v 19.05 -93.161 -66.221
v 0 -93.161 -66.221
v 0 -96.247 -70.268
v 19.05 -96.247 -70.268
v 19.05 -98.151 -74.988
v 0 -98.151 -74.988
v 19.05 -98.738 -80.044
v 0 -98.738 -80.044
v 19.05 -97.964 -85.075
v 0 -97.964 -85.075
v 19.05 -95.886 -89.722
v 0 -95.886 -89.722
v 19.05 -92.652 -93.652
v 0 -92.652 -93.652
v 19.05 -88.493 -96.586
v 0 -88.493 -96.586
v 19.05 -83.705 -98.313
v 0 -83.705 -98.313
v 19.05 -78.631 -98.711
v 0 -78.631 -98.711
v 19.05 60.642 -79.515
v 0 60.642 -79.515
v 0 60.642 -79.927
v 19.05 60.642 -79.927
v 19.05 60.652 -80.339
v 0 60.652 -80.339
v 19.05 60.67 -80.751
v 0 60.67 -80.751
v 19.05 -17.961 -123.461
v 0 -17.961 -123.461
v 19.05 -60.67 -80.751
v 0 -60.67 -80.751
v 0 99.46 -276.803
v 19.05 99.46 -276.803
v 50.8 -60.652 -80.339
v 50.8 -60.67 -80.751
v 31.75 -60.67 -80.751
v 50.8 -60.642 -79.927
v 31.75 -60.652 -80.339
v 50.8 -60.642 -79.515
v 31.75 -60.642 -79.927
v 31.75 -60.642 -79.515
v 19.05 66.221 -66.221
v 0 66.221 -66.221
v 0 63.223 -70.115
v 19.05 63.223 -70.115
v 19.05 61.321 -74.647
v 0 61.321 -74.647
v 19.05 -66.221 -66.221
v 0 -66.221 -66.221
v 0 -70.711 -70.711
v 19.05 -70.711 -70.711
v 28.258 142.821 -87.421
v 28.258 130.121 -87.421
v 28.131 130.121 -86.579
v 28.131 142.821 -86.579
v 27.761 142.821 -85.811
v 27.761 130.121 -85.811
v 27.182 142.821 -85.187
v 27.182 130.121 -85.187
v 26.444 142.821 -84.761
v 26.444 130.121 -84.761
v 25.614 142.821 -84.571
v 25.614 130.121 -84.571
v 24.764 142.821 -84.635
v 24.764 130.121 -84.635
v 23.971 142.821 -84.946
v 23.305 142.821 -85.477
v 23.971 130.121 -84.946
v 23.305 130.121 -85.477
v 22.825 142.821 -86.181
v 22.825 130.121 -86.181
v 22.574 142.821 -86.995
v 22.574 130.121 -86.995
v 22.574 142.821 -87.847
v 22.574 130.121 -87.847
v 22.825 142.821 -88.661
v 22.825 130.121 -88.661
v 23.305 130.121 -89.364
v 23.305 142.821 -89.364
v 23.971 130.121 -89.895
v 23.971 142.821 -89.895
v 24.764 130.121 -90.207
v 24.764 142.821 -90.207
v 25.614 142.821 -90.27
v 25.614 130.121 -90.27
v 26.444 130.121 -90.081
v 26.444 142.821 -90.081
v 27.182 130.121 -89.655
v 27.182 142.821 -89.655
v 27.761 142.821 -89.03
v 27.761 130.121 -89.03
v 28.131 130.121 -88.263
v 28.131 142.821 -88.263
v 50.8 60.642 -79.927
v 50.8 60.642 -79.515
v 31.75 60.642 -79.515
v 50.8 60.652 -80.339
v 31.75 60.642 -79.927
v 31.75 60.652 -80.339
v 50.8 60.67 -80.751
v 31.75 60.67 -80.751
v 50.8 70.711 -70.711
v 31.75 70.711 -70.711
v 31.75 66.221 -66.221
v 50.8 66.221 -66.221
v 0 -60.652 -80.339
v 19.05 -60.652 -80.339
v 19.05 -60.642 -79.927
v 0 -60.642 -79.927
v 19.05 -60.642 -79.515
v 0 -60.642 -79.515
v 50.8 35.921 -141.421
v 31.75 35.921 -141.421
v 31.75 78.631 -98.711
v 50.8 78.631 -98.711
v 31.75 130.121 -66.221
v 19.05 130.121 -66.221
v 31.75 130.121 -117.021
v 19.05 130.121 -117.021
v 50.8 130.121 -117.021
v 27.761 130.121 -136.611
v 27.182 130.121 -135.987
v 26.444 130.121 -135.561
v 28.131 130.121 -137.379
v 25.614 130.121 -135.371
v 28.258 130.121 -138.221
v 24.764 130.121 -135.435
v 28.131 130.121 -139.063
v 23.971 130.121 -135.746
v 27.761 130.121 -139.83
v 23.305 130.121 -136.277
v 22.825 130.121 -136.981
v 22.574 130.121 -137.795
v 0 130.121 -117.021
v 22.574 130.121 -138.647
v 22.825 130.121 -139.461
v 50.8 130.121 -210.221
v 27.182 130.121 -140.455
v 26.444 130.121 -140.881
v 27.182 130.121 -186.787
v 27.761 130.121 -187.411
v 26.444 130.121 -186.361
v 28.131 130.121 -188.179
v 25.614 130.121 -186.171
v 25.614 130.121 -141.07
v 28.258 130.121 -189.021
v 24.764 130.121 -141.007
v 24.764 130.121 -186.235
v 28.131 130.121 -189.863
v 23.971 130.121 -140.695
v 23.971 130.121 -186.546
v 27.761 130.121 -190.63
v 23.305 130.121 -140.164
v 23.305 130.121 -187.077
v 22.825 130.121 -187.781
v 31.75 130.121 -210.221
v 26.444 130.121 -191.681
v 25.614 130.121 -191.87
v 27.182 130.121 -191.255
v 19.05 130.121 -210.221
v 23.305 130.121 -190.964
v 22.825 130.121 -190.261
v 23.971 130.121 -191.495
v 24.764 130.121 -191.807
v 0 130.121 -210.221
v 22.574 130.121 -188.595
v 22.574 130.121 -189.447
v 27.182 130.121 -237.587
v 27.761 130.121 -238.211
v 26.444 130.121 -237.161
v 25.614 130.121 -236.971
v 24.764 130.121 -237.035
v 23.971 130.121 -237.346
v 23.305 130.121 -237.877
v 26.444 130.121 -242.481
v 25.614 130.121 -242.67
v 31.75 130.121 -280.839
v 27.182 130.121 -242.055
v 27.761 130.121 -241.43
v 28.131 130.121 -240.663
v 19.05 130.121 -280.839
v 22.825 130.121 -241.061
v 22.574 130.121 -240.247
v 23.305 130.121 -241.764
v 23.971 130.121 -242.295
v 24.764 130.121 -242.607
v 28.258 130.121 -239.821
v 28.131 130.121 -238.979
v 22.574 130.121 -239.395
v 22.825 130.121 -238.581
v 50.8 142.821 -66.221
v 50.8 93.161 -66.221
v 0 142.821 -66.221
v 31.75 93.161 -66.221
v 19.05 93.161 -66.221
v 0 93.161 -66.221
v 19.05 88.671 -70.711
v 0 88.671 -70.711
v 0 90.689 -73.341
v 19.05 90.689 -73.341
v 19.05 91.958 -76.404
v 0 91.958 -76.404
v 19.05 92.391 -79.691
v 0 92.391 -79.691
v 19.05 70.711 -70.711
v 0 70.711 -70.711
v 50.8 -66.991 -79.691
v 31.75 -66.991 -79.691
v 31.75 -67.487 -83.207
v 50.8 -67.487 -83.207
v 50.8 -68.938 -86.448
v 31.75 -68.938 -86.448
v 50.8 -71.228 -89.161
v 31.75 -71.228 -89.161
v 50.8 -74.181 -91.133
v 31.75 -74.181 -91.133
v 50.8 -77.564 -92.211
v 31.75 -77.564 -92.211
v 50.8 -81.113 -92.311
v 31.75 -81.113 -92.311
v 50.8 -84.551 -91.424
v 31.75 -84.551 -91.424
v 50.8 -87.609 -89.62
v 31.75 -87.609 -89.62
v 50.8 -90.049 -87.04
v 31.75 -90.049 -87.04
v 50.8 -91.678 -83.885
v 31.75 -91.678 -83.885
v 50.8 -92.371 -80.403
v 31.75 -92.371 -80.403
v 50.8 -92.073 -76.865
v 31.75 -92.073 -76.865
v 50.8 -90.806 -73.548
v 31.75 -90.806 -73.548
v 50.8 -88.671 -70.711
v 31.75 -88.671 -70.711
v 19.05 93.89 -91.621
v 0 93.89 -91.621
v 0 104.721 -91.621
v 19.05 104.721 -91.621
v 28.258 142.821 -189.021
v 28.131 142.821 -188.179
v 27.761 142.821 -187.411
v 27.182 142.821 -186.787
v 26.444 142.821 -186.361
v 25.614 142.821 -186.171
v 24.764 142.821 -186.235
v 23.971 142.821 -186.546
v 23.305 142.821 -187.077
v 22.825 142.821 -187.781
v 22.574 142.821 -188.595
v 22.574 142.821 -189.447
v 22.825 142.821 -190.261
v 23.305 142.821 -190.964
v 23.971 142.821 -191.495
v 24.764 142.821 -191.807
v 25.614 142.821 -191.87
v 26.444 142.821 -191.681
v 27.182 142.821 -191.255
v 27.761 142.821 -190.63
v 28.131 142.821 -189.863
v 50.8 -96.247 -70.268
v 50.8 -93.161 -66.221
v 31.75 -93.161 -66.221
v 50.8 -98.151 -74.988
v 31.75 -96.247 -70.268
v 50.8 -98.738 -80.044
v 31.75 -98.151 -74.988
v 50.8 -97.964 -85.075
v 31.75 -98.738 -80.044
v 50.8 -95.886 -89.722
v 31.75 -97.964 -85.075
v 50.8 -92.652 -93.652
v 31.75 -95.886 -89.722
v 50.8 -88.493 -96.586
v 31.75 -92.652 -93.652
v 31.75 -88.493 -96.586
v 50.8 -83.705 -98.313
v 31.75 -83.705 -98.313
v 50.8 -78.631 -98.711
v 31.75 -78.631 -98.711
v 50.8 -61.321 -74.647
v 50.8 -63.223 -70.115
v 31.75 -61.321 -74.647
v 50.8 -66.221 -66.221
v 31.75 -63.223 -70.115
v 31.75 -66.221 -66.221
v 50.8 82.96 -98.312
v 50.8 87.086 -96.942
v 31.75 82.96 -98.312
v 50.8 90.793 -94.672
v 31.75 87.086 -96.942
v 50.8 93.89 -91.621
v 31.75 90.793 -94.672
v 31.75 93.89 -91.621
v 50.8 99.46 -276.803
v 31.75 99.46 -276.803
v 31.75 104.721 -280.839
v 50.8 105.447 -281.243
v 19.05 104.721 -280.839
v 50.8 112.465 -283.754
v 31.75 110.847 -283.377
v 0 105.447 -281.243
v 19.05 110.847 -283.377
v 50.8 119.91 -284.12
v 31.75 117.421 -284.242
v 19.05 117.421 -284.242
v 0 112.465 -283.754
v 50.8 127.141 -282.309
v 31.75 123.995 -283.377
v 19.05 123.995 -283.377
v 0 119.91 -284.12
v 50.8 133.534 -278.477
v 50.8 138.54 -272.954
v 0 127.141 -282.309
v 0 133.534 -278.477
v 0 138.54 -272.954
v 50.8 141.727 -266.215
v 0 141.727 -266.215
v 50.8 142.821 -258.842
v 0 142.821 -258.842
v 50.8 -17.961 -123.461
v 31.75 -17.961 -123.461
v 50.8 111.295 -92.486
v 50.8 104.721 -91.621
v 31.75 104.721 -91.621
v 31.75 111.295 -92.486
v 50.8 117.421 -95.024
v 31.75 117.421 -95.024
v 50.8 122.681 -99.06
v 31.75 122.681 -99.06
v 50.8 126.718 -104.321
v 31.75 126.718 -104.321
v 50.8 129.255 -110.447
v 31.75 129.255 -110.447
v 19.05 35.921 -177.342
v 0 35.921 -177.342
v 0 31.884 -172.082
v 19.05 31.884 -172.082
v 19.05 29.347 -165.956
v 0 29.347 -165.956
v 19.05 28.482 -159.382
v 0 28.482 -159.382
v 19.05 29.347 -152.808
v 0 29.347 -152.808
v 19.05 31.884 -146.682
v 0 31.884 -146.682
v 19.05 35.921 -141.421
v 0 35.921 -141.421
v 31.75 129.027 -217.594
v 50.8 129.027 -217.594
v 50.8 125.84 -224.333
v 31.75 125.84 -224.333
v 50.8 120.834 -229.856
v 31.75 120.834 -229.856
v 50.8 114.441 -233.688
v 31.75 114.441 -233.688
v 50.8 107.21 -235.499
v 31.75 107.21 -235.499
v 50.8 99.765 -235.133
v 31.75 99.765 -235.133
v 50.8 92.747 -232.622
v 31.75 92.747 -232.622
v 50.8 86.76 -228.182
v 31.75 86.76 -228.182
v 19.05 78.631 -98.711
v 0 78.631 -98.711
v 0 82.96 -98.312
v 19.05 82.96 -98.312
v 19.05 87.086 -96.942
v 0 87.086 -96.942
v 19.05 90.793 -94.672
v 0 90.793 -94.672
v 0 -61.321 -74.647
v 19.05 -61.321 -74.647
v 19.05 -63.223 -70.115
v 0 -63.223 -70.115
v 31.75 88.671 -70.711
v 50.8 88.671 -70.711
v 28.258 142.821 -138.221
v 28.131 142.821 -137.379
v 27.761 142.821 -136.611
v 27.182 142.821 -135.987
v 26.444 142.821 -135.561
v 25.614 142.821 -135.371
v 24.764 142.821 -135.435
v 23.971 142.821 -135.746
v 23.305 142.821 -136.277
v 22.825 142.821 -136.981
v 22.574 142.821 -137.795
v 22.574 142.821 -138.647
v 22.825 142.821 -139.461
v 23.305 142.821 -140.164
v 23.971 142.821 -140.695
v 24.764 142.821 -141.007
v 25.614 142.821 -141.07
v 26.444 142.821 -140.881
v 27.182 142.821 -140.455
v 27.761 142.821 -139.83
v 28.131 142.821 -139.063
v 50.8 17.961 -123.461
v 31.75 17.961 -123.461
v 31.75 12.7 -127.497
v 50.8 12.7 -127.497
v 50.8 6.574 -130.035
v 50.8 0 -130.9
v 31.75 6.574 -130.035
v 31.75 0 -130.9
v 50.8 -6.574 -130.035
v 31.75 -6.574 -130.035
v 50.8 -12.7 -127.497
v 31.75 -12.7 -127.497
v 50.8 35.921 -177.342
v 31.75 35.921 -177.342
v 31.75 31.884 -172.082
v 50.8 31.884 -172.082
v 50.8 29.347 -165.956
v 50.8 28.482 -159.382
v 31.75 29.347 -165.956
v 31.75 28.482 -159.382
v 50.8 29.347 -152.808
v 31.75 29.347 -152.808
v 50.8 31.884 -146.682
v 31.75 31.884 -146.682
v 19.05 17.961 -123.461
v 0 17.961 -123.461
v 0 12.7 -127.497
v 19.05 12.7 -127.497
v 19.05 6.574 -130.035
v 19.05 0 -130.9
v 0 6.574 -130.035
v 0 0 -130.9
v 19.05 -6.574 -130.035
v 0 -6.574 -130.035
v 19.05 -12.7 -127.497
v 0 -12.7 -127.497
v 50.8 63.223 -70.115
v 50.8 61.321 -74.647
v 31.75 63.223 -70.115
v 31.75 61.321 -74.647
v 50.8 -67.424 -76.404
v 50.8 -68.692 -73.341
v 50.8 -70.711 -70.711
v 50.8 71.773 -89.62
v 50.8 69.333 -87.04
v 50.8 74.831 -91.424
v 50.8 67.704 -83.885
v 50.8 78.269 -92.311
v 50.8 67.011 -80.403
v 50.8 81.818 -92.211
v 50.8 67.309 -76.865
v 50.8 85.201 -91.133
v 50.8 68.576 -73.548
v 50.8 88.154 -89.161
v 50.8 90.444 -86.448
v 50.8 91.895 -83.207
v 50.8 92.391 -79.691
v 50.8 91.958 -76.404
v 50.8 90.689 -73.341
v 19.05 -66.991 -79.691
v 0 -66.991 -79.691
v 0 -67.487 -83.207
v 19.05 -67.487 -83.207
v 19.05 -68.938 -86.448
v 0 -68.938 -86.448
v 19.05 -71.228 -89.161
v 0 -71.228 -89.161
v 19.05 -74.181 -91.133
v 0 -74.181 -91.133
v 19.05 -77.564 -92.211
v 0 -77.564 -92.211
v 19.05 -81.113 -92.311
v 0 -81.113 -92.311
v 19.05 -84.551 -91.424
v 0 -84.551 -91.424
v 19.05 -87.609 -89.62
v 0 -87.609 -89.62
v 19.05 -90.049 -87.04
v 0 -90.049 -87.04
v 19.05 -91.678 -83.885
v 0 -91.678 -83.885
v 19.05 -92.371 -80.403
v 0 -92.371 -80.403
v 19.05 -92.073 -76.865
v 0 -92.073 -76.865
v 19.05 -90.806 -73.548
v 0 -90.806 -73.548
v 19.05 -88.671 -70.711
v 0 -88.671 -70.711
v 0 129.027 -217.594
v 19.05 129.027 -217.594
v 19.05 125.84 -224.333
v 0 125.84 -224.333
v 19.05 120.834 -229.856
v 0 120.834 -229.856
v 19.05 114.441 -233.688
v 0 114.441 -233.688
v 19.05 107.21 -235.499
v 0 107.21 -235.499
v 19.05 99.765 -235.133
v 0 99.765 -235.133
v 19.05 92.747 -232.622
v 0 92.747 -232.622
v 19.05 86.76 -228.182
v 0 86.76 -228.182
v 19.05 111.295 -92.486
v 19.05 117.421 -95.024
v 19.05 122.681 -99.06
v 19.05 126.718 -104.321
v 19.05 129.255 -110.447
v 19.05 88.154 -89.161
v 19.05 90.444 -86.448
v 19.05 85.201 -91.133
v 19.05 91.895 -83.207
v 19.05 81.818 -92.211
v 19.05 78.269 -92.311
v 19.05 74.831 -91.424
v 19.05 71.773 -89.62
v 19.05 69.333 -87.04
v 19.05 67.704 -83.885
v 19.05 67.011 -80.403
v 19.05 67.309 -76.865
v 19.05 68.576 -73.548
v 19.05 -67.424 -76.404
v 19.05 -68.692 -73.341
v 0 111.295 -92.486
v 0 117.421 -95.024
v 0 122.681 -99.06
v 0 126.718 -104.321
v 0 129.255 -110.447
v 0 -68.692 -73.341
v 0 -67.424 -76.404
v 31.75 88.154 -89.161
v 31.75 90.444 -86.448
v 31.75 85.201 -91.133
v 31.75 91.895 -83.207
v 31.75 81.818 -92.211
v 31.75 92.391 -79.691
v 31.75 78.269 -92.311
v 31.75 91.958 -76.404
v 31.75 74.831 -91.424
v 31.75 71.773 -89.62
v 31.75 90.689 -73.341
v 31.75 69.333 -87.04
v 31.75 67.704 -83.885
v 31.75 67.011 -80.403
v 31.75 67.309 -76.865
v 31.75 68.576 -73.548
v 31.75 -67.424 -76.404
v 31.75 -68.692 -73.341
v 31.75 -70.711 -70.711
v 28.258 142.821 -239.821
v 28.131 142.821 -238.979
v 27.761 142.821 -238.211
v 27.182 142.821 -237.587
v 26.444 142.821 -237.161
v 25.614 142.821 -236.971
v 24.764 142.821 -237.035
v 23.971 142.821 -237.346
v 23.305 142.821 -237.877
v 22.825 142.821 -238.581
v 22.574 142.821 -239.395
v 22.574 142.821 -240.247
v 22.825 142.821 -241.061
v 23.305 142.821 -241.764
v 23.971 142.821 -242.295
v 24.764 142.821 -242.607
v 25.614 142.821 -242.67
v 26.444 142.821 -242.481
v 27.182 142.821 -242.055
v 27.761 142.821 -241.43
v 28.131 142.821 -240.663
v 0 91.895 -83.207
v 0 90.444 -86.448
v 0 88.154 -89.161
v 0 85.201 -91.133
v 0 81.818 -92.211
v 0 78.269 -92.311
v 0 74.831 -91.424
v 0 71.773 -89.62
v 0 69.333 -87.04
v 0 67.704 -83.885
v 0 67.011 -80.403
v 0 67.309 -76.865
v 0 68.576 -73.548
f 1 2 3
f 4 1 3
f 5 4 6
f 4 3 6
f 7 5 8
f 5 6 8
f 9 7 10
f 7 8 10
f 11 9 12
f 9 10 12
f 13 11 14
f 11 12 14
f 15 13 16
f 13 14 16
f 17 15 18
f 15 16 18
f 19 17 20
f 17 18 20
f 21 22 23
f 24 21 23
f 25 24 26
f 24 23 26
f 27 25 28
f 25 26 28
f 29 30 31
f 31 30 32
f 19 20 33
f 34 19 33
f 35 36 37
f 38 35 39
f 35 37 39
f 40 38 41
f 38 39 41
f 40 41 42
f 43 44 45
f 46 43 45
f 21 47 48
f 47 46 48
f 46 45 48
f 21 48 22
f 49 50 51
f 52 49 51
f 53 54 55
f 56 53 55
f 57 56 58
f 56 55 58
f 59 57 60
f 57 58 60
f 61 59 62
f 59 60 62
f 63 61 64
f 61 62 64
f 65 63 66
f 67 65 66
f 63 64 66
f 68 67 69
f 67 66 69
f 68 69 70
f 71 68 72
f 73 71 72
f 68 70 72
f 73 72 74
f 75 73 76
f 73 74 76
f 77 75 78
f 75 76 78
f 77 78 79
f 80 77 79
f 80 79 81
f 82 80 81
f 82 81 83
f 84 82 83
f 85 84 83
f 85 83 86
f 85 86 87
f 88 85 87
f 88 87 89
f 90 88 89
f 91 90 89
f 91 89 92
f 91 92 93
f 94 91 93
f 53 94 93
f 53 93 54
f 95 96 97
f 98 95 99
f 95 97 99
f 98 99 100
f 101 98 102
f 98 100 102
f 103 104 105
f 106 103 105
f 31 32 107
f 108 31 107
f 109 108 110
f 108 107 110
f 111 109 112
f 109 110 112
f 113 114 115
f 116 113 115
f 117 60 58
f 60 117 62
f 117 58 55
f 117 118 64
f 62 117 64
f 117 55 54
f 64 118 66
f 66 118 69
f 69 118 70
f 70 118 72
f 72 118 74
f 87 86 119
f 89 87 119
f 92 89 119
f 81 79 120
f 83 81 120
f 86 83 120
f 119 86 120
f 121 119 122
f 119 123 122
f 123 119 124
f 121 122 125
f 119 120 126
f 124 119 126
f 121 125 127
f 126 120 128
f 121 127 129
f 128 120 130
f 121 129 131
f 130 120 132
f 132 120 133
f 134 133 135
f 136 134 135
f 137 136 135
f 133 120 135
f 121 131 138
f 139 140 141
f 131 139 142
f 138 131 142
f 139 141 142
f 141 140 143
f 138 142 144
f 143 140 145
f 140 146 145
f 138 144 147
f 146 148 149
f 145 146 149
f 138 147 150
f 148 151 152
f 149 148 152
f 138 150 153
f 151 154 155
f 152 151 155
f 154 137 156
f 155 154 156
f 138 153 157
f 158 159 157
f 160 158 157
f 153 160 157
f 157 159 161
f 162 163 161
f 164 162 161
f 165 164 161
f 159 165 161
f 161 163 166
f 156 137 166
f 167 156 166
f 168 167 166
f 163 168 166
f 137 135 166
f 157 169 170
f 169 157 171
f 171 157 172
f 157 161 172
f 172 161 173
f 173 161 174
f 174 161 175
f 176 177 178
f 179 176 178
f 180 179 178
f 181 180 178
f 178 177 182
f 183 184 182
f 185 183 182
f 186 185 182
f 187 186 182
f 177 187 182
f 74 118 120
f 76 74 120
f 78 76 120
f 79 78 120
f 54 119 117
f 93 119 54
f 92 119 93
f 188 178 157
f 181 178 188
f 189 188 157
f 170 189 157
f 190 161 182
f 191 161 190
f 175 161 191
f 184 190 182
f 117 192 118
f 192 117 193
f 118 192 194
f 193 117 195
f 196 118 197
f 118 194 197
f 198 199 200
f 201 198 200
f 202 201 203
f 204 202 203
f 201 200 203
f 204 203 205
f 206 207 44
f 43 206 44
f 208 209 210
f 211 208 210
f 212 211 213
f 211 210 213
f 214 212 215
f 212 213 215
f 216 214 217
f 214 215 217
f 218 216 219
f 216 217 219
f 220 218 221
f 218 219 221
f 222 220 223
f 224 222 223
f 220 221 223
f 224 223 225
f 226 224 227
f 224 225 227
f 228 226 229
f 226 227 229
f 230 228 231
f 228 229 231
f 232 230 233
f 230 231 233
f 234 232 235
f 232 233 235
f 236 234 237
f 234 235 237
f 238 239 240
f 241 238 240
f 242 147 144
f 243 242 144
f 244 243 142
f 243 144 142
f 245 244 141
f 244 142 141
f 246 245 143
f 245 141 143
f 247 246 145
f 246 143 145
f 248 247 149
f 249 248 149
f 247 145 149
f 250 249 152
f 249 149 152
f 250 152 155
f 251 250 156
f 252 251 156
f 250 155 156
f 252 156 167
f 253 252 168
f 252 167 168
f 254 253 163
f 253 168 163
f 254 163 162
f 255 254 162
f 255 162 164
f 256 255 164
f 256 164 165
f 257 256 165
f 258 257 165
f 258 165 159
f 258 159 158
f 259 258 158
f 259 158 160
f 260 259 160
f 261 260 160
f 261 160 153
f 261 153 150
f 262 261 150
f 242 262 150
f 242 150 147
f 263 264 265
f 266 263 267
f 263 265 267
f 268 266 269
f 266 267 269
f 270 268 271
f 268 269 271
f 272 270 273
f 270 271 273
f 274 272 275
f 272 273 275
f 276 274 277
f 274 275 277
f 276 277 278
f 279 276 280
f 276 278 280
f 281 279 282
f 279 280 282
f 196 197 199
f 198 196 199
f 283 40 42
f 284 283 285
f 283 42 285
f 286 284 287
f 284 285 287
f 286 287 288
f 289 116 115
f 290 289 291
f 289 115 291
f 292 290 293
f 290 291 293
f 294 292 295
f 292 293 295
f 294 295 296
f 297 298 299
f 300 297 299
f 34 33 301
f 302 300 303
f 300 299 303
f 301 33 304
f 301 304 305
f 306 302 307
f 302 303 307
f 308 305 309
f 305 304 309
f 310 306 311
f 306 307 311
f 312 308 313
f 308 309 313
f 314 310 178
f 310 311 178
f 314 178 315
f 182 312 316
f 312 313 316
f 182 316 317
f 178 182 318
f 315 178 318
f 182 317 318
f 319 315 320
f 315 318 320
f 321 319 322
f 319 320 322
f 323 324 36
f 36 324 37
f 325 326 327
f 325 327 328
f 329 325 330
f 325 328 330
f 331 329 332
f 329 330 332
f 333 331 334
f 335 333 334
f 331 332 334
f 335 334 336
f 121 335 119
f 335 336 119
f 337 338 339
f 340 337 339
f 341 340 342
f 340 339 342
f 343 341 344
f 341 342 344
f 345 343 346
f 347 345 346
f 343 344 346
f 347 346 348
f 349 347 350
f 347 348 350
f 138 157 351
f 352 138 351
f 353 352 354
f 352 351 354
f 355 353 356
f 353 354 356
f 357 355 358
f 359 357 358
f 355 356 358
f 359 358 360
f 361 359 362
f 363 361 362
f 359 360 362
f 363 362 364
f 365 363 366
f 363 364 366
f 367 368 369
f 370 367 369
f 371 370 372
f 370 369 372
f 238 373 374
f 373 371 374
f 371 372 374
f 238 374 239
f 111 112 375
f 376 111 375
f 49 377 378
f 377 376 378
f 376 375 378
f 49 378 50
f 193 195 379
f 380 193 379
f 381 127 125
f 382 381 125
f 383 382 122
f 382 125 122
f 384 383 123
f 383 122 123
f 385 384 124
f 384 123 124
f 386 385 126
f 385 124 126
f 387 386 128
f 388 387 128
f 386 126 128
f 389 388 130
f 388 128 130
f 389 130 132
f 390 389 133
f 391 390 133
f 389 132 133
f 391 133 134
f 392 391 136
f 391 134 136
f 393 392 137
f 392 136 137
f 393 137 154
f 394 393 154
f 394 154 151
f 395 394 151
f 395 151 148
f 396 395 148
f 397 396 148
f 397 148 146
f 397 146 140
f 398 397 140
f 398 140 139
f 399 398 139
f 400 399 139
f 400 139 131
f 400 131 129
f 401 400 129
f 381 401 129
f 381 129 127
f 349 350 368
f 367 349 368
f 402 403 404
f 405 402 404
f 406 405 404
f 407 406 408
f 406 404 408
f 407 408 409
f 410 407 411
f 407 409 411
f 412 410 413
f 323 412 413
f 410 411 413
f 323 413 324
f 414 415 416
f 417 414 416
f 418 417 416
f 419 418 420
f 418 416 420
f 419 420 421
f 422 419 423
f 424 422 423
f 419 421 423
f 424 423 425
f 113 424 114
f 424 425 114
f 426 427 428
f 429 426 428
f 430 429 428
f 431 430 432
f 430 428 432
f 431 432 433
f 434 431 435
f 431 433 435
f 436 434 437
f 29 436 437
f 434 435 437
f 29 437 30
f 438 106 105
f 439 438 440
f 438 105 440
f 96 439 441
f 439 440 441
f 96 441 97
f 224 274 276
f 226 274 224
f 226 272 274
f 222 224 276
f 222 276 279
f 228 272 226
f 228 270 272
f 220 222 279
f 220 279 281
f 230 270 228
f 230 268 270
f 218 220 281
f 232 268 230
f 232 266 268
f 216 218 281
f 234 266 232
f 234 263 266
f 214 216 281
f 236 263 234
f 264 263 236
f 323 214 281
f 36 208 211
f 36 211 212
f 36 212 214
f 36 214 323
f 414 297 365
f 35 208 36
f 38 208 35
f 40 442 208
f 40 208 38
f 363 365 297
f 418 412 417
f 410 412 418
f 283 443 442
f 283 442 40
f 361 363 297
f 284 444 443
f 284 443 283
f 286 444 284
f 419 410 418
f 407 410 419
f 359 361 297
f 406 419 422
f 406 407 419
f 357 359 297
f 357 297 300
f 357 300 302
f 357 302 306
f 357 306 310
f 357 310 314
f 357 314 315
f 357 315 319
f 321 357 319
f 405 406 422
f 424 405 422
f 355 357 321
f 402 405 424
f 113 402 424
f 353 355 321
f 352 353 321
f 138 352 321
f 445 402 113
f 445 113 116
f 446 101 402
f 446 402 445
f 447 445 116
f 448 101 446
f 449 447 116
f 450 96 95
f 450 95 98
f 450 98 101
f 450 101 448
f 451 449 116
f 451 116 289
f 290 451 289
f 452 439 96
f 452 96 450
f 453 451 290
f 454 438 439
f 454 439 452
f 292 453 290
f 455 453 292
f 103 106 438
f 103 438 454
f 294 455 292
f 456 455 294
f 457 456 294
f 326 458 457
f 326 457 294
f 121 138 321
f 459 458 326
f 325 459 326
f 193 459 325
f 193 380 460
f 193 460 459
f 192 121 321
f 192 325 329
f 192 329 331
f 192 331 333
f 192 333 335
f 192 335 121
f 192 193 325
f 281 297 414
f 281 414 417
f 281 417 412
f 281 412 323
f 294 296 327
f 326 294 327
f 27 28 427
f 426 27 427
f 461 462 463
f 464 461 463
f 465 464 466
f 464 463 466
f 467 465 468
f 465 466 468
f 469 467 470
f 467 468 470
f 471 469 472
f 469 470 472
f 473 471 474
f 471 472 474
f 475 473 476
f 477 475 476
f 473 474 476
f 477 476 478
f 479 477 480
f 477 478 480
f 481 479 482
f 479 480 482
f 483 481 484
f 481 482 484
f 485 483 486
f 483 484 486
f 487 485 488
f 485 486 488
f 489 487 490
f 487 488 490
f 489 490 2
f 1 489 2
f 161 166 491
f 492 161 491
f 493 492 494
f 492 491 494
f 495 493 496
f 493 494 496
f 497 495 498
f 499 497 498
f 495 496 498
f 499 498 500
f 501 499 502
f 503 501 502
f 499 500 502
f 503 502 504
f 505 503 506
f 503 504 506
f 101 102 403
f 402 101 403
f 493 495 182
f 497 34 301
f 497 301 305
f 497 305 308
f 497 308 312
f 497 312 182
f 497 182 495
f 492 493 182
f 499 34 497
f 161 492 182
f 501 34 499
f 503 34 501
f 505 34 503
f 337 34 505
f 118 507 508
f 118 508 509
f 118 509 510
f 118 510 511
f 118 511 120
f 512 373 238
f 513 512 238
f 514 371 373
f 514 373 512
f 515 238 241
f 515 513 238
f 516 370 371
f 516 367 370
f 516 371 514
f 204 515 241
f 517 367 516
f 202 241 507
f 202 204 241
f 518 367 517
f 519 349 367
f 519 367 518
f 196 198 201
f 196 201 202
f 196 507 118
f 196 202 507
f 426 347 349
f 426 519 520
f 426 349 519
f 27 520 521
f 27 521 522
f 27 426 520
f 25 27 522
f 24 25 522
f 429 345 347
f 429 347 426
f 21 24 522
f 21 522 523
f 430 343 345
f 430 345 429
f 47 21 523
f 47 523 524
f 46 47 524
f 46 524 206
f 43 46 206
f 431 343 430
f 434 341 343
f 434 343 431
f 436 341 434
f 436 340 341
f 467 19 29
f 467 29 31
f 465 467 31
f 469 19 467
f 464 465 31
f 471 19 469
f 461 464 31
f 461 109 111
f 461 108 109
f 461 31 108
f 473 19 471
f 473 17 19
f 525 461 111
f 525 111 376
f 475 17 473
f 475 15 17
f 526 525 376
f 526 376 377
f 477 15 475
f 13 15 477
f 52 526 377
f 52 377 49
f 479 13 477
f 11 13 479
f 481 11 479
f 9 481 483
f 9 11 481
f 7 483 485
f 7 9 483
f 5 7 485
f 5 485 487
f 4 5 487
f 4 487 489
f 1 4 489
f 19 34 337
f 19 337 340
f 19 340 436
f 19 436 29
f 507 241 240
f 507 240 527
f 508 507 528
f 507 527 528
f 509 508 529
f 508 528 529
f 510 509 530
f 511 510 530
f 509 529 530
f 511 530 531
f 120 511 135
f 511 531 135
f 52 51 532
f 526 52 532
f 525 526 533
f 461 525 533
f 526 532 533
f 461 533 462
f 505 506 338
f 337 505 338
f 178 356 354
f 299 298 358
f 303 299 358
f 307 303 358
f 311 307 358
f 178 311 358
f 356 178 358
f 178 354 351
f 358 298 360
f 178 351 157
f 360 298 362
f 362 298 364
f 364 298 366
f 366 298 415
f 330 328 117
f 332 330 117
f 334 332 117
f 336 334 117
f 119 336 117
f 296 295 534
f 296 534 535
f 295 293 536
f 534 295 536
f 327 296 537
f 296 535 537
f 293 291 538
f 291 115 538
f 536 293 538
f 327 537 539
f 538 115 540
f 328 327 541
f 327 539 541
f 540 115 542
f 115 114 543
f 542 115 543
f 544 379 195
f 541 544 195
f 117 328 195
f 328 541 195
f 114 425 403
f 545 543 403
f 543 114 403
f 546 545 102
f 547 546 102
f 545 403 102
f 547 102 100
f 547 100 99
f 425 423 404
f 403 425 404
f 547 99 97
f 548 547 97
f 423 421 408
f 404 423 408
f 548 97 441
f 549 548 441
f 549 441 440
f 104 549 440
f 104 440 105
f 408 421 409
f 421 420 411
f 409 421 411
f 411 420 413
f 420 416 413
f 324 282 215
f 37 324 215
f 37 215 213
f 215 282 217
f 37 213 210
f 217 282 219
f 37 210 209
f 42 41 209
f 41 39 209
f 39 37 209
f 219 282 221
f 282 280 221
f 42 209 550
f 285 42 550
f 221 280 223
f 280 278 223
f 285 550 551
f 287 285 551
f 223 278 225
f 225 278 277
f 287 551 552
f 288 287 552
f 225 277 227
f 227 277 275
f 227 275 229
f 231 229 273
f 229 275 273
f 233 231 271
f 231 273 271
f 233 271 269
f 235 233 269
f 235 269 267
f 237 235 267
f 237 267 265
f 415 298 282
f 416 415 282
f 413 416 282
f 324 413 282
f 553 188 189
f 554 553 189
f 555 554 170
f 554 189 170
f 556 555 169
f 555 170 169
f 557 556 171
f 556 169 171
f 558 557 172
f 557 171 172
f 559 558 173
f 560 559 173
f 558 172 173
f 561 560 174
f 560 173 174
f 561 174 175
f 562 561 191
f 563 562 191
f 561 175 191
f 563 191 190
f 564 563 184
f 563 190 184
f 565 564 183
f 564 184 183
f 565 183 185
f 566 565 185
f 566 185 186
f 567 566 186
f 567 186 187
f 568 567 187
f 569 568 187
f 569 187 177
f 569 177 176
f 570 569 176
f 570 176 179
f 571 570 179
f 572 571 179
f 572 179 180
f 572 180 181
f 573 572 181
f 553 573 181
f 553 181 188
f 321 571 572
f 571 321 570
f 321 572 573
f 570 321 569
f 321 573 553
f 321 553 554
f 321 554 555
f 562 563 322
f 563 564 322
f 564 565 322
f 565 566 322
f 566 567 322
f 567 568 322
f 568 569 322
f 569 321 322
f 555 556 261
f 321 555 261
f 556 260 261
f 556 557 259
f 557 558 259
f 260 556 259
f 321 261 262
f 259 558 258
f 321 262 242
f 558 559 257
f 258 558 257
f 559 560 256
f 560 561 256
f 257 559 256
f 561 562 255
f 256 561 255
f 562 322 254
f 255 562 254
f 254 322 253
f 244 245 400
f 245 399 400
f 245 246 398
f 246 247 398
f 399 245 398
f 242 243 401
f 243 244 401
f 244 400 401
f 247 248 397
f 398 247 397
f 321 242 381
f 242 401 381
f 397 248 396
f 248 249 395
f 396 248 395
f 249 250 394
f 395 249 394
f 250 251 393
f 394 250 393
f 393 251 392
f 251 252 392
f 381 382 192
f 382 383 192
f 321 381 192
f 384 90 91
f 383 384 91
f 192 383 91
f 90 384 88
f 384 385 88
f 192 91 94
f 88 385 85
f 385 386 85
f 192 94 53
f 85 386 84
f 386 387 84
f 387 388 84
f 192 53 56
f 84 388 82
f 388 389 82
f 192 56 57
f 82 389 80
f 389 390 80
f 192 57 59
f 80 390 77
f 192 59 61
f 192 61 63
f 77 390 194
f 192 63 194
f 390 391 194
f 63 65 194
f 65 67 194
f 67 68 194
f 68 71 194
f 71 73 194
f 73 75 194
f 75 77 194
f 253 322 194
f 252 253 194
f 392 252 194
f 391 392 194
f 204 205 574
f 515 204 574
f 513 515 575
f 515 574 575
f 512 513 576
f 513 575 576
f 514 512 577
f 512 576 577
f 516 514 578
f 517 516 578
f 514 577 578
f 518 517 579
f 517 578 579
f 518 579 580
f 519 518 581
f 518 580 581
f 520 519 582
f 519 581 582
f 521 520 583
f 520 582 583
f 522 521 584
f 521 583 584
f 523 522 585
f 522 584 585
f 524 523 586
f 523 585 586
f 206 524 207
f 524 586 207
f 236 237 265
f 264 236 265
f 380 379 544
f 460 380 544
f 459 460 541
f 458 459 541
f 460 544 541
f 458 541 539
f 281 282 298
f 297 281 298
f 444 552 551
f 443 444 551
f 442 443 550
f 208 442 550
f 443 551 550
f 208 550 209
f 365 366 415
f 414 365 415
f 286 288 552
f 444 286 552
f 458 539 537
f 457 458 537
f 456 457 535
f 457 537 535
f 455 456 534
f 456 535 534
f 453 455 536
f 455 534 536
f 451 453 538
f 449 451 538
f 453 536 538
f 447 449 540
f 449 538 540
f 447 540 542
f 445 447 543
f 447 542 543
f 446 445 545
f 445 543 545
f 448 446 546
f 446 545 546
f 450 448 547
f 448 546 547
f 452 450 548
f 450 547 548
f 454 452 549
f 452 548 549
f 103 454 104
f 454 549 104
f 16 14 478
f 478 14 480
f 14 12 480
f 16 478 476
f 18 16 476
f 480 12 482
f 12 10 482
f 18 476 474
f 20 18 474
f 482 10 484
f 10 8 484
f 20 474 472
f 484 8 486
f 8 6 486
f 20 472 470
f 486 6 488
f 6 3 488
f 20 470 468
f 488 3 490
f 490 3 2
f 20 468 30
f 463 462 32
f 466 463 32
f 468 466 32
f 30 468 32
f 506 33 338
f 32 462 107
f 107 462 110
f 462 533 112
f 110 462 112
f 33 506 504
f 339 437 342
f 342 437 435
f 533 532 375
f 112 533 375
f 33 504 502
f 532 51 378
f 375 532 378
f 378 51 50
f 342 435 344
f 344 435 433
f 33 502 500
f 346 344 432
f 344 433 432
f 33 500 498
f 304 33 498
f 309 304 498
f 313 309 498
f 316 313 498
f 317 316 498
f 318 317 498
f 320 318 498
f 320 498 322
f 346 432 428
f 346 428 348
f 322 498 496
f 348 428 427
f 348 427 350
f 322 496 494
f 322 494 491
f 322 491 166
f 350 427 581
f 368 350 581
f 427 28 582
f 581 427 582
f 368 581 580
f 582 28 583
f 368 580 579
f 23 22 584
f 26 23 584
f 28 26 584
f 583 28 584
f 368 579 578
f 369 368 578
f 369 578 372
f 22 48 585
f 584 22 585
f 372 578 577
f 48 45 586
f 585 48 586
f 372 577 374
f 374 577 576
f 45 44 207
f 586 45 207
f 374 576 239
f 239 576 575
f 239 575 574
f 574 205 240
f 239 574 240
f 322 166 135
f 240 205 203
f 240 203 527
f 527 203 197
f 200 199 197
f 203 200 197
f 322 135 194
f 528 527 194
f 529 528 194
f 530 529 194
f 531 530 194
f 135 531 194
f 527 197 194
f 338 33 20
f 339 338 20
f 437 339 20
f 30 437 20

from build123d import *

# Parameters (mm, degrees)
F1_DEPTH = 50.8
F3_W     = 12.7
F3_H     = 218.0215369846
F4_DEPTH = 254
F5_R     = 2.8575
F6_DEPTH = 12.701


with BuildPart() as f1:
    # F0 (on Right) → F1 (new body)
    with BuildSketch(Plane.YZ):
        with BuildLine():
            ThreePointArc((92.3909342397, -79.6909342397), (74.8308546487, -91.4242043026), (70.7106781187, -70.7106781187))
            ThreePointArc((70.7106781187, -70.7106781187), (65.8235712608, -75.2811893269), (60.6417499855, -79.5146411593))
            ThreePointArc((60.6417499855, -79.5146411593), (60.6460643138, -80.133008335), (60.6704465476, -80.7509096897))
            Line((60.6704465476, -80.7509096897), (17.9605122421, -123.4608439952))
            ThreePointArc((17.9605122421, -123.4608439952), (0, -130.900331753), (-17.9605122421, -123.4608439952))
            Line((-17.9605122421, -123.4608439952), (-60.6704465476, -80.7509096897))
            ThreePointArc((-60.6704465476, -80.7509096897), (-60.6460643138, -80.133008335), (-60.6417499855, -79.5146411593))
            ThreePointArc((-60.6417499855, -79.5146411593), (-65.8235712608, -75.2811893269), (-70.7106781187, -70.7106781187))
            ThreePointArc((-70.7106781187, -70.7106781187), (-67.9576641768, -74.8308546487), (-66.9909342397, -79.6909342397))
            ThreePointArc((-66.9909342397, -79.6909342397), (-84.5510138308, -91.4242043026), (-88.6711903608, -70.7106781187))
            Line((-88.6711903608, -70.7106781187), (-93.1613184213, -66.2205500581))
            ThreePointArc((-93.1613184213, -66.2205500581), (-97.0811254405, -87.4680641731), (-78.6309587898, -98.7114219318))
            Line((-78.6309587898, -98.7114219318), (99.4602185633, -276.8025992848))
            ThreePointArc((99.4602185633, -276.8025992848), (127.1408899875, -282.3086271685), (142.8207308054, -258.8420870427))
            Line((142.8207308054, -258.8420870427), (142.8207308054, -66.2205500581))
            Line((142.8207308054, -66.2205500581), (130.1207308054, -66.2205500581))
            Line((130.1207308054, -66.2205500581), (93.1613184213, -66.2205500581))
            Line((93.1613184213, -66.2205500581), (88.6711903608, -70.7106781187))
            ThreePointArc((88.6711903608, -70.7106781187), (91.4242043026, -74.8308546487), (92.3909342397, -79.6909342397))
        make_face()
        with BuildLine():
            ThreePointArc((78.6309587898, -98.7114219318), (87.0857697361, -96.9419835869), (93.8899658968, -91.6205500581))
            Line((93.8899658968, -91.6205500581), (104.7207308054, -91.6205500581))
            ThreePointArc((104.7207308054, -91.6205500581), (122.6812430475, -99.060037816), (130.1207308054, -117.0205500581))
            Line((130.1207308054, -117.0205500581), (130.1207308054, -210.2210625584))
            ThreePointArc((130.1207308054, -210.2210625584), (114.4408899875, -233.6876026842), (86.7602185633, -228.1815748006))
            Line((86.7602185633, -228.1815748006), (35.9210244843, -177.3423807216))
            ThreePointArc((35.9210244843, -177.3423807216), (28.4815367264, -159.3818684794), (35.9210244843, -141.4213562373))
            Line((35.9210244843, -141.4213562373), (78.6309587898, -98.7114219318))
        make_face(mode=Mode.SUBTRACT)
        with BuildLine():
            ThreePointArc((60.6417499855, -79.5146411593), (65.8235712608, -75.2811893269), (70.7106781187, -70.7106781187))
            Line((70.7106781187, -70.7106781187), (66.2205500581, -66.2205500581))
            ThreePointArc((66.2205500581, -66.2205500581), (62.1249501408, -72.3194552405), (60.6417499855, -79.5146411593))
        make_face()
        with BuildLine():
            Line((-66.2205500581, -66.2205500581), (-70.7106781187, -70.7106781187))
            ThreePointArc((-70.7106781187, -70.7106781187), (-65.8235712608, -75.2811893269), (-60.6417499855, -79.5146411593))
            ThreePointArc((-60.6417499855, -79.5146411593), (-62.1249501408, -72.3194552405), (-66.2205500581, -66.2205500581))
        make_face()
    extrude(amount=F1_DEPTH)

    # F3 (on offset) → F4 (cut, through all)
    with BuildSketch(Plane.XZ.offset(123.8792691946)):
        with Locations((25.4, -175.2313185504)):
            Rectangle(F3_W, F3_H)
    extrude(amount=-F4_DEPTH, mode=Mode.SUBTRACT)

    # F5 (on face) → F6 (cut, through all)
    with BuildSketch(Plane.XZ.offset(-130.1207308054)):
        with Locations((25.4, -138.2208063083)):
            Circle(F5_R)
        with Locations((25.4, -87.4208063083)):
            Circle(F5_R)
        with Locations((25.4, -239.8208063083)):
            Circle(F5_R)
        with Locations((25.4, -189.0208063083)):
            Circle(F5_R)
    extrude(amount=-F6_DEPTH, mode=Mode.SUBTRACT)


solid = f1.part
